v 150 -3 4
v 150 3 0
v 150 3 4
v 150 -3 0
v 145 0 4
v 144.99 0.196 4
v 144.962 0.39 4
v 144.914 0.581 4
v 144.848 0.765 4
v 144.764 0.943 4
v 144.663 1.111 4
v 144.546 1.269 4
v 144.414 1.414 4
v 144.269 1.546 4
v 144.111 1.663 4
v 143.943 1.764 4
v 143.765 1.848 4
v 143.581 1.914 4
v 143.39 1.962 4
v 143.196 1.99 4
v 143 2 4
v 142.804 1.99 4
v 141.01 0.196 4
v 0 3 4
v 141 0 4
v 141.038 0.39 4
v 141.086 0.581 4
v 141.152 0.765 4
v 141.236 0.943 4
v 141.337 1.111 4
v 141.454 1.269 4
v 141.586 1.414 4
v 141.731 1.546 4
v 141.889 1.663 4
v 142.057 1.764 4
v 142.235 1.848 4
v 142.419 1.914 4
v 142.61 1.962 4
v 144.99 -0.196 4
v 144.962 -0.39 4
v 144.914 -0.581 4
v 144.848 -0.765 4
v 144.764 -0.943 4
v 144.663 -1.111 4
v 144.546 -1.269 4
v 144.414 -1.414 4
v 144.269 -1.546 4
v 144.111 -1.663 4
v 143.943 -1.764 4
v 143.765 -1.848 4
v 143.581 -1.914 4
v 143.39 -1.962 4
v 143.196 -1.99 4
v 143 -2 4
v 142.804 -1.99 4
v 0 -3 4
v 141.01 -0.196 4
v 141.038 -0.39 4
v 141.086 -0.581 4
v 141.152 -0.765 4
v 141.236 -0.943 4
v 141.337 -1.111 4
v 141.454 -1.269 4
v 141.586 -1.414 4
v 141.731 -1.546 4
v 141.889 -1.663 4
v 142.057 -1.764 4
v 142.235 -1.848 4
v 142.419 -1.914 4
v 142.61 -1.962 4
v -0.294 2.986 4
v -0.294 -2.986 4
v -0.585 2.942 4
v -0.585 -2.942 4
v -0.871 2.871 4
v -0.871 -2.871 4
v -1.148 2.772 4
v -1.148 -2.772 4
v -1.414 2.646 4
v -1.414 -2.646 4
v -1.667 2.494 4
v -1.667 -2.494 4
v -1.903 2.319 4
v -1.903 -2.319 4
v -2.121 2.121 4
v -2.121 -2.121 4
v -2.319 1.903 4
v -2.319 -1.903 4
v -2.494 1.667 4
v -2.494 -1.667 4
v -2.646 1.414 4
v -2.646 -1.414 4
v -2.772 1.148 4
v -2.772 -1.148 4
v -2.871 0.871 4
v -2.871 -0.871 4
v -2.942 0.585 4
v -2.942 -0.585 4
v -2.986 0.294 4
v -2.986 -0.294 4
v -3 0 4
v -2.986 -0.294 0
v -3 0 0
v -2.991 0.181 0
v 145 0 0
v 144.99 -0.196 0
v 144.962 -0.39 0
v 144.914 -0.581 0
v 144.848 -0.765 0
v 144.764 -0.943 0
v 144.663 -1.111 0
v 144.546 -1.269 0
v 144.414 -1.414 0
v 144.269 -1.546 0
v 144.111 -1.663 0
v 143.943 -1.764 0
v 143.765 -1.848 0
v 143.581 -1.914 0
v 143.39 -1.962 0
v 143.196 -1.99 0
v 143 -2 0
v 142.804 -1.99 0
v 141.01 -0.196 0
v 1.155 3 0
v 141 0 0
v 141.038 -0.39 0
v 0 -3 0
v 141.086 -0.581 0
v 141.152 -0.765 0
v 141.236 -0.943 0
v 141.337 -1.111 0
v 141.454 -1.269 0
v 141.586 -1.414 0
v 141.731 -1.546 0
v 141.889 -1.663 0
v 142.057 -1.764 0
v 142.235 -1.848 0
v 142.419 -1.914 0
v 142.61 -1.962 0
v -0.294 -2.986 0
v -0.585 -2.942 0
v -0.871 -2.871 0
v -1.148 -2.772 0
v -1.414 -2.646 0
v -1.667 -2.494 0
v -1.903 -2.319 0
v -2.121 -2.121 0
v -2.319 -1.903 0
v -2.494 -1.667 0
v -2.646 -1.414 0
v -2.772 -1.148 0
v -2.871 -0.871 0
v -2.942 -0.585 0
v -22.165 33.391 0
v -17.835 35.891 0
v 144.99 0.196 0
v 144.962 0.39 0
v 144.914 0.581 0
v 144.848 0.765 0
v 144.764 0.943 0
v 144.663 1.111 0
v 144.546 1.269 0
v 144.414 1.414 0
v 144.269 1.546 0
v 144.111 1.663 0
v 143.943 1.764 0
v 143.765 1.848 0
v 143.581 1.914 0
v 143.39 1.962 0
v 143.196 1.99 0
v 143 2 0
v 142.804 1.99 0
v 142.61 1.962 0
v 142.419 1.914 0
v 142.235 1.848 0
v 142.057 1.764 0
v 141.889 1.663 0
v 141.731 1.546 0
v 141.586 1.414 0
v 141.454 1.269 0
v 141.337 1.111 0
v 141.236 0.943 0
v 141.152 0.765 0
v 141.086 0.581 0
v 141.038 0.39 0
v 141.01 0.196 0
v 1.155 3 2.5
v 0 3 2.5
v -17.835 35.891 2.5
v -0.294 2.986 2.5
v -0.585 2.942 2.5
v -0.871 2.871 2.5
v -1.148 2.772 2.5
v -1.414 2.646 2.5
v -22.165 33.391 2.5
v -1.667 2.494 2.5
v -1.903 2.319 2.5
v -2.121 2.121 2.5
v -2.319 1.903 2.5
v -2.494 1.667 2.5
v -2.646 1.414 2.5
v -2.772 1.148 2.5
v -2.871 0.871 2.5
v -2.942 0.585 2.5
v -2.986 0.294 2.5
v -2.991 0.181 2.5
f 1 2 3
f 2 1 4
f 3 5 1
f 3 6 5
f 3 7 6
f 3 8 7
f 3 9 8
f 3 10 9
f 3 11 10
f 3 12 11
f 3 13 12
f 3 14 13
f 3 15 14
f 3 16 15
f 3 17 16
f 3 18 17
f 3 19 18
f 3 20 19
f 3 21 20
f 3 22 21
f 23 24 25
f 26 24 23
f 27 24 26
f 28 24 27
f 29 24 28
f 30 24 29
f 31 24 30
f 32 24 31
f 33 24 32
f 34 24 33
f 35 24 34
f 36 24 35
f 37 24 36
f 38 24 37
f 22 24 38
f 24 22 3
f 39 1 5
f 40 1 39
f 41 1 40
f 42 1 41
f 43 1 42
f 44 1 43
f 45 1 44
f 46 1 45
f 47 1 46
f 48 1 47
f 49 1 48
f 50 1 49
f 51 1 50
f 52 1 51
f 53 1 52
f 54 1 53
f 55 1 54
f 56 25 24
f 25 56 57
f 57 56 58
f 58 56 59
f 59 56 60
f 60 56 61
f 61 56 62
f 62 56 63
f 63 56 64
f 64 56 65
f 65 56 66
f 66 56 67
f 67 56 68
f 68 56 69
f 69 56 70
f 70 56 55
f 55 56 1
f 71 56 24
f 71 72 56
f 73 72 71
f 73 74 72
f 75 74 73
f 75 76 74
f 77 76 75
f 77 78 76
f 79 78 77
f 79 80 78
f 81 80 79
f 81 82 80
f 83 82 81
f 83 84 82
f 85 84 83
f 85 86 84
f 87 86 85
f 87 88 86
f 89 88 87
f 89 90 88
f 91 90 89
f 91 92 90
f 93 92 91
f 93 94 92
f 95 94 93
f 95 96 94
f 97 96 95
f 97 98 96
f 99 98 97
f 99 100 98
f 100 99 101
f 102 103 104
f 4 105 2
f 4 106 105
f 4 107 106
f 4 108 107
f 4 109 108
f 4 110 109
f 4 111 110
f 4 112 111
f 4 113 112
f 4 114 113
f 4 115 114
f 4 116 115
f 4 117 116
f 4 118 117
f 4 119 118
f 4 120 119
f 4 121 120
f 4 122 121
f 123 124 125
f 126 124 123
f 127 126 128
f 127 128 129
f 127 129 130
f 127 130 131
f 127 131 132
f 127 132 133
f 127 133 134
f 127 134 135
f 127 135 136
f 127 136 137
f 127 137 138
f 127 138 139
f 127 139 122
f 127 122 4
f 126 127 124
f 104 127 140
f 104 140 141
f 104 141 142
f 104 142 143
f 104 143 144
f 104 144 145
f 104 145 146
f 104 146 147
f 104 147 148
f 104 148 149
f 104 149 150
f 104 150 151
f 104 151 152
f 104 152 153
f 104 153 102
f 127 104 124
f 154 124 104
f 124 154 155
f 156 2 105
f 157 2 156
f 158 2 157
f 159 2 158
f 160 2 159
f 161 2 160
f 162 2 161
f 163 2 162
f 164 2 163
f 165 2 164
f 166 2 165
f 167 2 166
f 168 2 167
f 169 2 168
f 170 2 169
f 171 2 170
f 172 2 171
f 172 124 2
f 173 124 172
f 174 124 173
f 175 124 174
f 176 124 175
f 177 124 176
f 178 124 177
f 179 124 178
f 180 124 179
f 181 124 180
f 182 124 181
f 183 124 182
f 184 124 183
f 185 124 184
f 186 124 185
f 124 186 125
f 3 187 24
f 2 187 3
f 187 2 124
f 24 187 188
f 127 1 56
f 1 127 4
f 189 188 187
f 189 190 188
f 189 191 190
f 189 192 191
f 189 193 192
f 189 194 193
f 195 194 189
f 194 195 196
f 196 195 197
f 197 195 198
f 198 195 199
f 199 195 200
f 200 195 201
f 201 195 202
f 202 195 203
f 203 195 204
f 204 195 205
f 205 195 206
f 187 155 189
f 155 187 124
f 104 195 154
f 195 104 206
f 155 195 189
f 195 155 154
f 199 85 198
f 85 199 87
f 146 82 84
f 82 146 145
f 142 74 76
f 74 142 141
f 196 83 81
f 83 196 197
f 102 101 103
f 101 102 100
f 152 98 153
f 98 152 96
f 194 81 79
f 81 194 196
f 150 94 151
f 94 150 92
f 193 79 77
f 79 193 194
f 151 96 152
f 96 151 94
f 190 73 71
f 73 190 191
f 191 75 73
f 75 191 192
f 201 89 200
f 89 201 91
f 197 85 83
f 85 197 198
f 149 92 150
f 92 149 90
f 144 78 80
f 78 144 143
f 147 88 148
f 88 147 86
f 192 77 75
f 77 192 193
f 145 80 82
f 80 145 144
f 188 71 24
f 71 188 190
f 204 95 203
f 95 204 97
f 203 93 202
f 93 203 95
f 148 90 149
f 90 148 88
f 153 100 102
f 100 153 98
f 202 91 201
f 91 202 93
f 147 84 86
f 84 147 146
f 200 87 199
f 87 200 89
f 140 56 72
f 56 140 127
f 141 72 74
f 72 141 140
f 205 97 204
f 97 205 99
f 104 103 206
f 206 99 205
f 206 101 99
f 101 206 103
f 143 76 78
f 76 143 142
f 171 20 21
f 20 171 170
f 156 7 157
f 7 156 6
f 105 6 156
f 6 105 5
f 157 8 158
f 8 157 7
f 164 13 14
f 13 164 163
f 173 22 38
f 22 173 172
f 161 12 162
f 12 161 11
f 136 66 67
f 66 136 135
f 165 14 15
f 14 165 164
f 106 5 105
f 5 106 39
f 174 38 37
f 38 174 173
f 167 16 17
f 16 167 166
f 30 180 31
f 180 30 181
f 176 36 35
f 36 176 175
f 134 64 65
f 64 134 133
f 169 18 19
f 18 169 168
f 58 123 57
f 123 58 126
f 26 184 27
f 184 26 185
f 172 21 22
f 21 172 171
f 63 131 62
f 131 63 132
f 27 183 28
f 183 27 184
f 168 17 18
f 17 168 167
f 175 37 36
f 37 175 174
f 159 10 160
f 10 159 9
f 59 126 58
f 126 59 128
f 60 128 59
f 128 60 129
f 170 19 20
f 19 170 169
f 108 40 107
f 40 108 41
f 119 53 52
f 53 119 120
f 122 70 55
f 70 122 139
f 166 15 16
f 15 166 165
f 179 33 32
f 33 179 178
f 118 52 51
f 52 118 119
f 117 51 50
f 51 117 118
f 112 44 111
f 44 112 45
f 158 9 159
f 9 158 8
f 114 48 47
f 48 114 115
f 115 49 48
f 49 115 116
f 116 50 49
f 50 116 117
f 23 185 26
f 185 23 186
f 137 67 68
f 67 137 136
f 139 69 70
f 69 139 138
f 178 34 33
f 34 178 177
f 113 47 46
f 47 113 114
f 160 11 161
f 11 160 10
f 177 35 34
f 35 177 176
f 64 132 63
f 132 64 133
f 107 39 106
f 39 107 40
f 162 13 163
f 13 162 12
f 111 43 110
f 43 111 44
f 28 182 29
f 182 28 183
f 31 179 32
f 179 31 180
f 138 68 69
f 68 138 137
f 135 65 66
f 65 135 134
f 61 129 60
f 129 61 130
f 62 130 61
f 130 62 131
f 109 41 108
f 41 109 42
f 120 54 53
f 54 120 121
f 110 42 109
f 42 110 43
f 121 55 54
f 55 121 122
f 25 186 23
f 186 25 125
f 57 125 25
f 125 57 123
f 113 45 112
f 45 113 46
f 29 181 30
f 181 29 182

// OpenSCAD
// L-shaped (hockey-stick) cell spreader, printed lying flat on the XY plane.
// All dimensions in millimetres.

$fn = 64;

// Handle bar
handle_len   = 150;   // length along +X
handle_w     = 6;     // width in Y
handle_t     = 4;     // thickness in Z

// Spreading foot bar
foot_len     = 40;    // length along its own axis
foot_w       = 5;     // width
foot_t       = 2.5;   // thickness (smooth bed side)
foot_angle   = 120;   // degrees CCW from +X, seen from above

// Round boss at the origin
boss_d       = 6;     // diameter
boss_t       = 4;     // height

// Hanging hole in the handle
hole_d       = 4;     // diameter
hole_x       = 143;   // centre X position
hole_y       = 0;     // centre Y position

// ---- Handle (axis-aligned bar, x = 0..150, y = -3..3, z = 0..4) ----
module handle() { translate([0, -handle_w/2, 0])
    cube([handle_len, handle_w, handle_t]); }

// ---- Spreading foot (rotated 120° about Z, local x = 0..40) ----
module foot() { rotate([0, 0, foot_angle])
    translate([0, -foot_w/2, 0])
    cube([foot_len, foot_w, foot_t]); }

// ---- Round boss at the origin (6 mm dia, 4 mm tall) ----
module boss() { cylinder(h = boss_t, d = boss_d); }

// ---- Hanging hole through the handle (4 mm dia, at x = 143, y = 0) ----
module hole() { translate([hole_x, hole_y, -1])
    cylinder(h = handle_t + 2, d = hole_d); }

// ---- Assemble: union of the three solids, then subtract the hole ----
difference() {
    union() {
        handle();
        foot();
        boss();
    }
    hole();
}
